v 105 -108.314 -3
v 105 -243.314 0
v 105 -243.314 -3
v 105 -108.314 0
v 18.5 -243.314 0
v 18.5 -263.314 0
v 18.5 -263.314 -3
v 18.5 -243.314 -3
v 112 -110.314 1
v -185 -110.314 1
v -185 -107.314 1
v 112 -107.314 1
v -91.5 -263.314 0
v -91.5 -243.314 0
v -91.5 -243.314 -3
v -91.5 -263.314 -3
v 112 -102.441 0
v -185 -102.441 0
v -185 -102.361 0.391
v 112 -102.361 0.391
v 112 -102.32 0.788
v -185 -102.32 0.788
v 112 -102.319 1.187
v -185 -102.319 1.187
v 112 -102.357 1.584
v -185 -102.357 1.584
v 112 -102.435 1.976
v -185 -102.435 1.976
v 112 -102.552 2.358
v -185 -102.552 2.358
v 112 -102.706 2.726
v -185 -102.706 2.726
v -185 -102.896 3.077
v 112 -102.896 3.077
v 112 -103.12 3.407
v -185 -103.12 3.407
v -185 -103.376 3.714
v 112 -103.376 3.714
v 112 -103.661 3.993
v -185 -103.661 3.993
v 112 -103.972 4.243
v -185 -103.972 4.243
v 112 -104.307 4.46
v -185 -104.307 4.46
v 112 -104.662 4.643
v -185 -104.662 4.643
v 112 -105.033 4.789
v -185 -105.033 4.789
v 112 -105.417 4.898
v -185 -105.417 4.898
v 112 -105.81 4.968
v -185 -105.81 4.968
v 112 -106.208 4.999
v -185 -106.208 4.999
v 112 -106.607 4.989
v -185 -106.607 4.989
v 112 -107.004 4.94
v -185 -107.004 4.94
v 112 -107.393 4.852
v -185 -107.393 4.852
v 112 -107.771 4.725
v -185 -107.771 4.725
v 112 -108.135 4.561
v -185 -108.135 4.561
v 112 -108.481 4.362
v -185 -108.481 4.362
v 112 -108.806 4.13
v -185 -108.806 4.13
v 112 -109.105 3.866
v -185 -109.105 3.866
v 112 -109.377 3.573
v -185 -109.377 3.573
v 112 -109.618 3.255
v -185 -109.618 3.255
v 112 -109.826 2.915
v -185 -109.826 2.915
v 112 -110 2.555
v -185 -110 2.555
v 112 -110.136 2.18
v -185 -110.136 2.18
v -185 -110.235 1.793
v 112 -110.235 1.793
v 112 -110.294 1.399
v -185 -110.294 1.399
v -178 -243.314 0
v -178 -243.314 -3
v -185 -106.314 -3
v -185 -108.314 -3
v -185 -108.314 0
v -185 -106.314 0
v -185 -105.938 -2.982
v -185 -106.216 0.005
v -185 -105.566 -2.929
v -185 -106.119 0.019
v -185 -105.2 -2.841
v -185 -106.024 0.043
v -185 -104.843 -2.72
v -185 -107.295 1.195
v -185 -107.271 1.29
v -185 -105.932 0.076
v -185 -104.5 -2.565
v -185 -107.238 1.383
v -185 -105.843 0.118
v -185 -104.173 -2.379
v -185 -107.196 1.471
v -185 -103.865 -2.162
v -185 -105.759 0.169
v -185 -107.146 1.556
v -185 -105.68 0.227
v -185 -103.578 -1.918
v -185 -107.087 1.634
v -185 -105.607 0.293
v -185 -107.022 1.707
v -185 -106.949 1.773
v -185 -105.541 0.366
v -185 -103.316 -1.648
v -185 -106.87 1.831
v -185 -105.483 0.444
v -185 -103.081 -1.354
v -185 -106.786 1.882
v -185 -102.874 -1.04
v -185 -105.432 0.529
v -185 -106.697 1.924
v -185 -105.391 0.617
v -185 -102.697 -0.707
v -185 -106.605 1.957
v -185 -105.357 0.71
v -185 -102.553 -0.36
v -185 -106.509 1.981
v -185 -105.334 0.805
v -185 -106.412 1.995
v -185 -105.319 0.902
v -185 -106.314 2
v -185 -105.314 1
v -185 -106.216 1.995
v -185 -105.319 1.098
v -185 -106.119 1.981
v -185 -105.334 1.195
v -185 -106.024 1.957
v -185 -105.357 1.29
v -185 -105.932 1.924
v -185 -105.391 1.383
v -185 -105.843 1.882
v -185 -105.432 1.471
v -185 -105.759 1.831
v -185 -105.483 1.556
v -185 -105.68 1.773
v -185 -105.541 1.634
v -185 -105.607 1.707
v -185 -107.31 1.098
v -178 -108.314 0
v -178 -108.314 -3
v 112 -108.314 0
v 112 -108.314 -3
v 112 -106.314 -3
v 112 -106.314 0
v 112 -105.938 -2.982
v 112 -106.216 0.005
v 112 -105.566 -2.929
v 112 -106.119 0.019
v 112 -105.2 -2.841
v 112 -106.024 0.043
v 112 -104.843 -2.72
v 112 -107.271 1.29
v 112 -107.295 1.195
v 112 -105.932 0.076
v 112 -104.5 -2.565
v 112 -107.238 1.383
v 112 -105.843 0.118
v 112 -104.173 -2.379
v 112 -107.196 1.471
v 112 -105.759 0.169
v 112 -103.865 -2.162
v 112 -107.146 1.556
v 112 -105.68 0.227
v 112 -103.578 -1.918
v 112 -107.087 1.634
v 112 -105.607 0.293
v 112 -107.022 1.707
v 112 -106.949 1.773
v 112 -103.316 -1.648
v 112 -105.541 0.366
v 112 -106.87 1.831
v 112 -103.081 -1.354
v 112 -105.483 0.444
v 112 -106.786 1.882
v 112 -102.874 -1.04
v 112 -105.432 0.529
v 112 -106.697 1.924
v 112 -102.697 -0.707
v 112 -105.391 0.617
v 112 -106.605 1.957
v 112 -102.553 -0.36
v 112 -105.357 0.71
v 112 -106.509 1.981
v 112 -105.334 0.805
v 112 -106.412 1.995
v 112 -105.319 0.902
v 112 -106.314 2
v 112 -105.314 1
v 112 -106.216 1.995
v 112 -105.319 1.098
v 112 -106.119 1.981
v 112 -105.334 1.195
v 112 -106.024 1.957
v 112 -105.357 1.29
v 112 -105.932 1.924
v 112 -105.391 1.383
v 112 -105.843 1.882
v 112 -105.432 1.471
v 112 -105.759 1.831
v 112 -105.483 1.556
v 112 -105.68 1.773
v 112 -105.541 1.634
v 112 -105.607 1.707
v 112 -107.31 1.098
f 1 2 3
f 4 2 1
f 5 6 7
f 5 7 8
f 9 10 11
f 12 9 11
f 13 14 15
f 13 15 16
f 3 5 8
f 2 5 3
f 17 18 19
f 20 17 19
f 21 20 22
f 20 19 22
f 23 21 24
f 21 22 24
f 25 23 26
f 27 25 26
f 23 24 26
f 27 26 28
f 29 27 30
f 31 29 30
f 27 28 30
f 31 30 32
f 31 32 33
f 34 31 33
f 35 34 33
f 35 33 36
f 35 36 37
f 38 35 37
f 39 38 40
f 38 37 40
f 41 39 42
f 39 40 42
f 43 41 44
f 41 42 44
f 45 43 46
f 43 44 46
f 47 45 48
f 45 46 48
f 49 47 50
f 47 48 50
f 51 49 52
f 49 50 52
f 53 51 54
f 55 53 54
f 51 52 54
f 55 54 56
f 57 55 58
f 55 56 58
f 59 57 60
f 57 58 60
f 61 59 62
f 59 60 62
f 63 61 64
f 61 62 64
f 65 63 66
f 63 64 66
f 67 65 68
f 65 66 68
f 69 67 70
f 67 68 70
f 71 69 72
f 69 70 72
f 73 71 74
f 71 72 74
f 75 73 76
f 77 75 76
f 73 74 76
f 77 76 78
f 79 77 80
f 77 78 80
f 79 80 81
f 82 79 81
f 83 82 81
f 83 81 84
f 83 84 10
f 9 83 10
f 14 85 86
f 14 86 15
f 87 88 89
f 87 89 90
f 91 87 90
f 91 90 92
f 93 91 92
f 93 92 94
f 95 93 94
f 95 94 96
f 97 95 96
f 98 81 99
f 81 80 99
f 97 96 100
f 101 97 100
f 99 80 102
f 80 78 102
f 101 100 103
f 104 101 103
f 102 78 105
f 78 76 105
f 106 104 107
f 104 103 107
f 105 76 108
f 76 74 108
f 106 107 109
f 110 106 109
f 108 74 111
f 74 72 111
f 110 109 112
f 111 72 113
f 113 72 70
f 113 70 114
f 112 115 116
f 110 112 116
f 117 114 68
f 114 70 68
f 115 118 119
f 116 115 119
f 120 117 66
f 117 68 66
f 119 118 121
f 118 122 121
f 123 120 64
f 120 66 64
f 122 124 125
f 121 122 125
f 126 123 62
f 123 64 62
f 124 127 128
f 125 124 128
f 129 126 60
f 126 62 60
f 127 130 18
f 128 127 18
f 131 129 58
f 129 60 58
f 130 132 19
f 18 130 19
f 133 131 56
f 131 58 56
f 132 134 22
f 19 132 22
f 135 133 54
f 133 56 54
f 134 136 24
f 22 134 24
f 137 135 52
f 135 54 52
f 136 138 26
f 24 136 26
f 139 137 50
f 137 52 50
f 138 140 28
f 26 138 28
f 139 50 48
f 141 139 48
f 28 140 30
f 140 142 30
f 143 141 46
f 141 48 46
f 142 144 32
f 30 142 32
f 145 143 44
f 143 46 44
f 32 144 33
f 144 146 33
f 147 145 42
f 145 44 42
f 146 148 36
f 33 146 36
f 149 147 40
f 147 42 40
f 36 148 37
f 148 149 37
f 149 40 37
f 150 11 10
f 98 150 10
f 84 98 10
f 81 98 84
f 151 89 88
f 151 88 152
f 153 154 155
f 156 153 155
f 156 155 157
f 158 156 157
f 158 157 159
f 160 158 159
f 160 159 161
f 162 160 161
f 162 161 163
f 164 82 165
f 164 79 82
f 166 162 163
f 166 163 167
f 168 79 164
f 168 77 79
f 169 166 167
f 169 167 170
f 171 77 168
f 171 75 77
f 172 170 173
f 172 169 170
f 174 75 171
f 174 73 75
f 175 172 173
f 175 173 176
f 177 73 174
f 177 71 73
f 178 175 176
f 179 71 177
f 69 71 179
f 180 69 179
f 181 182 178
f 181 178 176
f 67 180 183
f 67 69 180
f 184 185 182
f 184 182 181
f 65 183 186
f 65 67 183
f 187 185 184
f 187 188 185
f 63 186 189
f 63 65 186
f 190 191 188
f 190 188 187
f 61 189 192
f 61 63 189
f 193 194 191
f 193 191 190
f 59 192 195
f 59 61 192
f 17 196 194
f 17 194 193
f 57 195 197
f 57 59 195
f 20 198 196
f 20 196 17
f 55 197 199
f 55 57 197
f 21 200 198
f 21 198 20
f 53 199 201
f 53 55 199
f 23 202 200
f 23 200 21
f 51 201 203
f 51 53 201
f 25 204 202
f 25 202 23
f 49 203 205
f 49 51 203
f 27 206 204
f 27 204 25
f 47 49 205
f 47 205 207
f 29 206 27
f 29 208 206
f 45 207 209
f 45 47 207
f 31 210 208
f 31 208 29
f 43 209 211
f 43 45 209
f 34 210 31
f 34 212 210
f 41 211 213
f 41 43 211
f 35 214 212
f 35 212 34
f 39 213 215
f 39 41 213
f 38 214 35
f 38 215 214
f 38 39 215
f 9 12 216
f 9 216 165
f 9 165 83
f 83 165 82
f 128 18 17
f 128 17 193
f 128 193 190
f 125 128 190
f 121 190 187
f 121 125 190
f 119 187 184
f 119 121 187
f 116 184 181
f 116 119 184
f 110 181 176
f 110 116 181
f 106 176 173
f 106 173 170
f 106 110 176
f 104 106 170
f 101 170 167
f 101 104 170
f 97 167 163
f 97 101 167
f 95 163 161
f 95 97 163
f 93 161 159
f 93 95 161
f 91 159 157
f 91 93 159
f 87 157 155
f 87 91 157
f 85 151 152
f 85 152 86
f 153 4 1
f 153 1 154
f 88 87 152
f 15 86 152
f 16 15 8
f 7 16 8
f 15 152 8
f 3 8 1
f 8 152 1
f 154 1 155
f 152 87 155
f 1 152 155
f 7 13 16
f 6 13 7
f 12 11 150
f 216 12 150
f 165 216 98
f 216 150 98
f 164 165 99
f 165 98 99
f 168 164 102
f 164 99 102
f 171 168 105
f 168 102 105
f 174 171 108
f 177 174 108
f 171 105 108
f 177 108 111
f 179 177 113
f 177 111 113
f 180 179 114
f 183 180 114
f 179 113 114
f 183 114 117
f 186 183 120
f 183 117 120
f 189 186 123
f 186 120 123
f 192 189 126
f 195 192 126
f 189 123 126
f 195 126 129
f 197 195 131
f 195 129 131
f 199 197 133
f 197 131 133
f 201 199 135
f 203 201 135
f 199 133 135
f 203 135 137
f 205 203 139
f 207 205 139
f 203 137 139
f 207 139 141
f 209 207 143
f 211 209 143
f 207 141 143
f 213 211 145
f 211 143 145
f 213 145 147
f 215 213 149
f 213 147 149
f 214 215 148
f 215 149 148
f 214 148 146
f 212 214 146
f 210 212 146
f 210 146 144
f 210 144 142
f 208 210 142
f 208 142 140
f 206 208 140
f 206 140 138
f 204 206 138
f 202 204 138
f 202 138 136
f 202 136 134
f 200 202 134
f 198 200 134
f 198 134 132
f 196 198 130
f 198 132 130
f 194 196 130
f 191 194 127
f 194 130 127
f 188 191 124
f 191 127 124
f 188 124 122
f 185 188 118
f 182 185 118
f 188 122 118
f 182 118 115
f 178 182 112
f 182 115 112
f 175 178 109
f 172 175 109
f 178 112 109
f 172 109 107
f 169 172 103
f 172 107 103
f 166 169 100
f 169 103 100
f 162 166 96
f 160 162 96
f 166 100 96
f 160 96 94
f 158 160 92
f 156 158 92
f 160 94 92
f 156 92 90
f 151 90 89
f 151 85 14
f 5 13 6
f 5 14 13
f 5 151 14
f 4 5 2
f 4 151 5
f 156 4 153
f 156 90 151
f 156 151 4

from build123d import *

# Parameters (mm, degrees)
BASE_FLANGE1_DEPTH = 3
HEM1_START         = -185.00035483
HEM1_DEPTH         = 297
HEM1_2_DEPTH       = 297


# Read off the part's stored shape, not the designer's step: Hem1
# Sheet-metal steps are written as plain solids
with BuildPart() as part:
    # Sketch1 → Base-Flange1 (new body)
    with BuildSketch(Plane.XY):
        Polygon((18.49964517, -243.314393939), (104.99964517, -243.314393939), (104.99964517, -108.314393939), (111.99964517, -108.314393939), (111.99964517, -102.314393939), (-185.00035483, -102.314393939), (-185.00035483, -108.314393939), (-178.00035483, -108.314393939), (-178.00035483, -243.314393939), (-91.50035483, -243.314393939), (-91.50035483, -263.314393939), (18.49964517, -263.314393939), align=None)
    extrude(amount=-BASE_FLANGE1_DEPTH)

    # Hem1 outline → Hem1 (cut)
    with BuildSketch(Plane.YZ.offset(HEM1_START)):
        with BuildLine():
            Line((-102.314393939, 0), (-102.441410593, 0))
            ThreePointArc((-102.441410593, 0), (-103.864904196, -2.16227766), (-106.314393939, -3))
            Line((-106.314393939, -3), (-102.314393939, -3))
            Line((-102.314393939, -3), (-102.314393939, 0))
        make_face()
    extrude(amount=HEM1_DEPTH, mode=Mode.SUBTRACT)

    # Hem1 2 outline → Hem1 2 (add)
    with BuildSketch(Plane.YZ.offset(HEM1_START)):
        with BuildLine():
            Line((-110.314393939, 1), (-107.314393939, 1))
            ThreePointArc((-107.314393939, 1), (-105.607287158, 1.707106781), (-106.314393939, 0))
            Line((-106.314393939, 0), (-102.441410593, 0))
            ThreePointArc((-102.441410593, 0), (-105.810376769, 4.968118785), (-110.314393939, 1))
        make_face()
    extrude(amount=HEM1_2_DEPTH)


solid = part.part
